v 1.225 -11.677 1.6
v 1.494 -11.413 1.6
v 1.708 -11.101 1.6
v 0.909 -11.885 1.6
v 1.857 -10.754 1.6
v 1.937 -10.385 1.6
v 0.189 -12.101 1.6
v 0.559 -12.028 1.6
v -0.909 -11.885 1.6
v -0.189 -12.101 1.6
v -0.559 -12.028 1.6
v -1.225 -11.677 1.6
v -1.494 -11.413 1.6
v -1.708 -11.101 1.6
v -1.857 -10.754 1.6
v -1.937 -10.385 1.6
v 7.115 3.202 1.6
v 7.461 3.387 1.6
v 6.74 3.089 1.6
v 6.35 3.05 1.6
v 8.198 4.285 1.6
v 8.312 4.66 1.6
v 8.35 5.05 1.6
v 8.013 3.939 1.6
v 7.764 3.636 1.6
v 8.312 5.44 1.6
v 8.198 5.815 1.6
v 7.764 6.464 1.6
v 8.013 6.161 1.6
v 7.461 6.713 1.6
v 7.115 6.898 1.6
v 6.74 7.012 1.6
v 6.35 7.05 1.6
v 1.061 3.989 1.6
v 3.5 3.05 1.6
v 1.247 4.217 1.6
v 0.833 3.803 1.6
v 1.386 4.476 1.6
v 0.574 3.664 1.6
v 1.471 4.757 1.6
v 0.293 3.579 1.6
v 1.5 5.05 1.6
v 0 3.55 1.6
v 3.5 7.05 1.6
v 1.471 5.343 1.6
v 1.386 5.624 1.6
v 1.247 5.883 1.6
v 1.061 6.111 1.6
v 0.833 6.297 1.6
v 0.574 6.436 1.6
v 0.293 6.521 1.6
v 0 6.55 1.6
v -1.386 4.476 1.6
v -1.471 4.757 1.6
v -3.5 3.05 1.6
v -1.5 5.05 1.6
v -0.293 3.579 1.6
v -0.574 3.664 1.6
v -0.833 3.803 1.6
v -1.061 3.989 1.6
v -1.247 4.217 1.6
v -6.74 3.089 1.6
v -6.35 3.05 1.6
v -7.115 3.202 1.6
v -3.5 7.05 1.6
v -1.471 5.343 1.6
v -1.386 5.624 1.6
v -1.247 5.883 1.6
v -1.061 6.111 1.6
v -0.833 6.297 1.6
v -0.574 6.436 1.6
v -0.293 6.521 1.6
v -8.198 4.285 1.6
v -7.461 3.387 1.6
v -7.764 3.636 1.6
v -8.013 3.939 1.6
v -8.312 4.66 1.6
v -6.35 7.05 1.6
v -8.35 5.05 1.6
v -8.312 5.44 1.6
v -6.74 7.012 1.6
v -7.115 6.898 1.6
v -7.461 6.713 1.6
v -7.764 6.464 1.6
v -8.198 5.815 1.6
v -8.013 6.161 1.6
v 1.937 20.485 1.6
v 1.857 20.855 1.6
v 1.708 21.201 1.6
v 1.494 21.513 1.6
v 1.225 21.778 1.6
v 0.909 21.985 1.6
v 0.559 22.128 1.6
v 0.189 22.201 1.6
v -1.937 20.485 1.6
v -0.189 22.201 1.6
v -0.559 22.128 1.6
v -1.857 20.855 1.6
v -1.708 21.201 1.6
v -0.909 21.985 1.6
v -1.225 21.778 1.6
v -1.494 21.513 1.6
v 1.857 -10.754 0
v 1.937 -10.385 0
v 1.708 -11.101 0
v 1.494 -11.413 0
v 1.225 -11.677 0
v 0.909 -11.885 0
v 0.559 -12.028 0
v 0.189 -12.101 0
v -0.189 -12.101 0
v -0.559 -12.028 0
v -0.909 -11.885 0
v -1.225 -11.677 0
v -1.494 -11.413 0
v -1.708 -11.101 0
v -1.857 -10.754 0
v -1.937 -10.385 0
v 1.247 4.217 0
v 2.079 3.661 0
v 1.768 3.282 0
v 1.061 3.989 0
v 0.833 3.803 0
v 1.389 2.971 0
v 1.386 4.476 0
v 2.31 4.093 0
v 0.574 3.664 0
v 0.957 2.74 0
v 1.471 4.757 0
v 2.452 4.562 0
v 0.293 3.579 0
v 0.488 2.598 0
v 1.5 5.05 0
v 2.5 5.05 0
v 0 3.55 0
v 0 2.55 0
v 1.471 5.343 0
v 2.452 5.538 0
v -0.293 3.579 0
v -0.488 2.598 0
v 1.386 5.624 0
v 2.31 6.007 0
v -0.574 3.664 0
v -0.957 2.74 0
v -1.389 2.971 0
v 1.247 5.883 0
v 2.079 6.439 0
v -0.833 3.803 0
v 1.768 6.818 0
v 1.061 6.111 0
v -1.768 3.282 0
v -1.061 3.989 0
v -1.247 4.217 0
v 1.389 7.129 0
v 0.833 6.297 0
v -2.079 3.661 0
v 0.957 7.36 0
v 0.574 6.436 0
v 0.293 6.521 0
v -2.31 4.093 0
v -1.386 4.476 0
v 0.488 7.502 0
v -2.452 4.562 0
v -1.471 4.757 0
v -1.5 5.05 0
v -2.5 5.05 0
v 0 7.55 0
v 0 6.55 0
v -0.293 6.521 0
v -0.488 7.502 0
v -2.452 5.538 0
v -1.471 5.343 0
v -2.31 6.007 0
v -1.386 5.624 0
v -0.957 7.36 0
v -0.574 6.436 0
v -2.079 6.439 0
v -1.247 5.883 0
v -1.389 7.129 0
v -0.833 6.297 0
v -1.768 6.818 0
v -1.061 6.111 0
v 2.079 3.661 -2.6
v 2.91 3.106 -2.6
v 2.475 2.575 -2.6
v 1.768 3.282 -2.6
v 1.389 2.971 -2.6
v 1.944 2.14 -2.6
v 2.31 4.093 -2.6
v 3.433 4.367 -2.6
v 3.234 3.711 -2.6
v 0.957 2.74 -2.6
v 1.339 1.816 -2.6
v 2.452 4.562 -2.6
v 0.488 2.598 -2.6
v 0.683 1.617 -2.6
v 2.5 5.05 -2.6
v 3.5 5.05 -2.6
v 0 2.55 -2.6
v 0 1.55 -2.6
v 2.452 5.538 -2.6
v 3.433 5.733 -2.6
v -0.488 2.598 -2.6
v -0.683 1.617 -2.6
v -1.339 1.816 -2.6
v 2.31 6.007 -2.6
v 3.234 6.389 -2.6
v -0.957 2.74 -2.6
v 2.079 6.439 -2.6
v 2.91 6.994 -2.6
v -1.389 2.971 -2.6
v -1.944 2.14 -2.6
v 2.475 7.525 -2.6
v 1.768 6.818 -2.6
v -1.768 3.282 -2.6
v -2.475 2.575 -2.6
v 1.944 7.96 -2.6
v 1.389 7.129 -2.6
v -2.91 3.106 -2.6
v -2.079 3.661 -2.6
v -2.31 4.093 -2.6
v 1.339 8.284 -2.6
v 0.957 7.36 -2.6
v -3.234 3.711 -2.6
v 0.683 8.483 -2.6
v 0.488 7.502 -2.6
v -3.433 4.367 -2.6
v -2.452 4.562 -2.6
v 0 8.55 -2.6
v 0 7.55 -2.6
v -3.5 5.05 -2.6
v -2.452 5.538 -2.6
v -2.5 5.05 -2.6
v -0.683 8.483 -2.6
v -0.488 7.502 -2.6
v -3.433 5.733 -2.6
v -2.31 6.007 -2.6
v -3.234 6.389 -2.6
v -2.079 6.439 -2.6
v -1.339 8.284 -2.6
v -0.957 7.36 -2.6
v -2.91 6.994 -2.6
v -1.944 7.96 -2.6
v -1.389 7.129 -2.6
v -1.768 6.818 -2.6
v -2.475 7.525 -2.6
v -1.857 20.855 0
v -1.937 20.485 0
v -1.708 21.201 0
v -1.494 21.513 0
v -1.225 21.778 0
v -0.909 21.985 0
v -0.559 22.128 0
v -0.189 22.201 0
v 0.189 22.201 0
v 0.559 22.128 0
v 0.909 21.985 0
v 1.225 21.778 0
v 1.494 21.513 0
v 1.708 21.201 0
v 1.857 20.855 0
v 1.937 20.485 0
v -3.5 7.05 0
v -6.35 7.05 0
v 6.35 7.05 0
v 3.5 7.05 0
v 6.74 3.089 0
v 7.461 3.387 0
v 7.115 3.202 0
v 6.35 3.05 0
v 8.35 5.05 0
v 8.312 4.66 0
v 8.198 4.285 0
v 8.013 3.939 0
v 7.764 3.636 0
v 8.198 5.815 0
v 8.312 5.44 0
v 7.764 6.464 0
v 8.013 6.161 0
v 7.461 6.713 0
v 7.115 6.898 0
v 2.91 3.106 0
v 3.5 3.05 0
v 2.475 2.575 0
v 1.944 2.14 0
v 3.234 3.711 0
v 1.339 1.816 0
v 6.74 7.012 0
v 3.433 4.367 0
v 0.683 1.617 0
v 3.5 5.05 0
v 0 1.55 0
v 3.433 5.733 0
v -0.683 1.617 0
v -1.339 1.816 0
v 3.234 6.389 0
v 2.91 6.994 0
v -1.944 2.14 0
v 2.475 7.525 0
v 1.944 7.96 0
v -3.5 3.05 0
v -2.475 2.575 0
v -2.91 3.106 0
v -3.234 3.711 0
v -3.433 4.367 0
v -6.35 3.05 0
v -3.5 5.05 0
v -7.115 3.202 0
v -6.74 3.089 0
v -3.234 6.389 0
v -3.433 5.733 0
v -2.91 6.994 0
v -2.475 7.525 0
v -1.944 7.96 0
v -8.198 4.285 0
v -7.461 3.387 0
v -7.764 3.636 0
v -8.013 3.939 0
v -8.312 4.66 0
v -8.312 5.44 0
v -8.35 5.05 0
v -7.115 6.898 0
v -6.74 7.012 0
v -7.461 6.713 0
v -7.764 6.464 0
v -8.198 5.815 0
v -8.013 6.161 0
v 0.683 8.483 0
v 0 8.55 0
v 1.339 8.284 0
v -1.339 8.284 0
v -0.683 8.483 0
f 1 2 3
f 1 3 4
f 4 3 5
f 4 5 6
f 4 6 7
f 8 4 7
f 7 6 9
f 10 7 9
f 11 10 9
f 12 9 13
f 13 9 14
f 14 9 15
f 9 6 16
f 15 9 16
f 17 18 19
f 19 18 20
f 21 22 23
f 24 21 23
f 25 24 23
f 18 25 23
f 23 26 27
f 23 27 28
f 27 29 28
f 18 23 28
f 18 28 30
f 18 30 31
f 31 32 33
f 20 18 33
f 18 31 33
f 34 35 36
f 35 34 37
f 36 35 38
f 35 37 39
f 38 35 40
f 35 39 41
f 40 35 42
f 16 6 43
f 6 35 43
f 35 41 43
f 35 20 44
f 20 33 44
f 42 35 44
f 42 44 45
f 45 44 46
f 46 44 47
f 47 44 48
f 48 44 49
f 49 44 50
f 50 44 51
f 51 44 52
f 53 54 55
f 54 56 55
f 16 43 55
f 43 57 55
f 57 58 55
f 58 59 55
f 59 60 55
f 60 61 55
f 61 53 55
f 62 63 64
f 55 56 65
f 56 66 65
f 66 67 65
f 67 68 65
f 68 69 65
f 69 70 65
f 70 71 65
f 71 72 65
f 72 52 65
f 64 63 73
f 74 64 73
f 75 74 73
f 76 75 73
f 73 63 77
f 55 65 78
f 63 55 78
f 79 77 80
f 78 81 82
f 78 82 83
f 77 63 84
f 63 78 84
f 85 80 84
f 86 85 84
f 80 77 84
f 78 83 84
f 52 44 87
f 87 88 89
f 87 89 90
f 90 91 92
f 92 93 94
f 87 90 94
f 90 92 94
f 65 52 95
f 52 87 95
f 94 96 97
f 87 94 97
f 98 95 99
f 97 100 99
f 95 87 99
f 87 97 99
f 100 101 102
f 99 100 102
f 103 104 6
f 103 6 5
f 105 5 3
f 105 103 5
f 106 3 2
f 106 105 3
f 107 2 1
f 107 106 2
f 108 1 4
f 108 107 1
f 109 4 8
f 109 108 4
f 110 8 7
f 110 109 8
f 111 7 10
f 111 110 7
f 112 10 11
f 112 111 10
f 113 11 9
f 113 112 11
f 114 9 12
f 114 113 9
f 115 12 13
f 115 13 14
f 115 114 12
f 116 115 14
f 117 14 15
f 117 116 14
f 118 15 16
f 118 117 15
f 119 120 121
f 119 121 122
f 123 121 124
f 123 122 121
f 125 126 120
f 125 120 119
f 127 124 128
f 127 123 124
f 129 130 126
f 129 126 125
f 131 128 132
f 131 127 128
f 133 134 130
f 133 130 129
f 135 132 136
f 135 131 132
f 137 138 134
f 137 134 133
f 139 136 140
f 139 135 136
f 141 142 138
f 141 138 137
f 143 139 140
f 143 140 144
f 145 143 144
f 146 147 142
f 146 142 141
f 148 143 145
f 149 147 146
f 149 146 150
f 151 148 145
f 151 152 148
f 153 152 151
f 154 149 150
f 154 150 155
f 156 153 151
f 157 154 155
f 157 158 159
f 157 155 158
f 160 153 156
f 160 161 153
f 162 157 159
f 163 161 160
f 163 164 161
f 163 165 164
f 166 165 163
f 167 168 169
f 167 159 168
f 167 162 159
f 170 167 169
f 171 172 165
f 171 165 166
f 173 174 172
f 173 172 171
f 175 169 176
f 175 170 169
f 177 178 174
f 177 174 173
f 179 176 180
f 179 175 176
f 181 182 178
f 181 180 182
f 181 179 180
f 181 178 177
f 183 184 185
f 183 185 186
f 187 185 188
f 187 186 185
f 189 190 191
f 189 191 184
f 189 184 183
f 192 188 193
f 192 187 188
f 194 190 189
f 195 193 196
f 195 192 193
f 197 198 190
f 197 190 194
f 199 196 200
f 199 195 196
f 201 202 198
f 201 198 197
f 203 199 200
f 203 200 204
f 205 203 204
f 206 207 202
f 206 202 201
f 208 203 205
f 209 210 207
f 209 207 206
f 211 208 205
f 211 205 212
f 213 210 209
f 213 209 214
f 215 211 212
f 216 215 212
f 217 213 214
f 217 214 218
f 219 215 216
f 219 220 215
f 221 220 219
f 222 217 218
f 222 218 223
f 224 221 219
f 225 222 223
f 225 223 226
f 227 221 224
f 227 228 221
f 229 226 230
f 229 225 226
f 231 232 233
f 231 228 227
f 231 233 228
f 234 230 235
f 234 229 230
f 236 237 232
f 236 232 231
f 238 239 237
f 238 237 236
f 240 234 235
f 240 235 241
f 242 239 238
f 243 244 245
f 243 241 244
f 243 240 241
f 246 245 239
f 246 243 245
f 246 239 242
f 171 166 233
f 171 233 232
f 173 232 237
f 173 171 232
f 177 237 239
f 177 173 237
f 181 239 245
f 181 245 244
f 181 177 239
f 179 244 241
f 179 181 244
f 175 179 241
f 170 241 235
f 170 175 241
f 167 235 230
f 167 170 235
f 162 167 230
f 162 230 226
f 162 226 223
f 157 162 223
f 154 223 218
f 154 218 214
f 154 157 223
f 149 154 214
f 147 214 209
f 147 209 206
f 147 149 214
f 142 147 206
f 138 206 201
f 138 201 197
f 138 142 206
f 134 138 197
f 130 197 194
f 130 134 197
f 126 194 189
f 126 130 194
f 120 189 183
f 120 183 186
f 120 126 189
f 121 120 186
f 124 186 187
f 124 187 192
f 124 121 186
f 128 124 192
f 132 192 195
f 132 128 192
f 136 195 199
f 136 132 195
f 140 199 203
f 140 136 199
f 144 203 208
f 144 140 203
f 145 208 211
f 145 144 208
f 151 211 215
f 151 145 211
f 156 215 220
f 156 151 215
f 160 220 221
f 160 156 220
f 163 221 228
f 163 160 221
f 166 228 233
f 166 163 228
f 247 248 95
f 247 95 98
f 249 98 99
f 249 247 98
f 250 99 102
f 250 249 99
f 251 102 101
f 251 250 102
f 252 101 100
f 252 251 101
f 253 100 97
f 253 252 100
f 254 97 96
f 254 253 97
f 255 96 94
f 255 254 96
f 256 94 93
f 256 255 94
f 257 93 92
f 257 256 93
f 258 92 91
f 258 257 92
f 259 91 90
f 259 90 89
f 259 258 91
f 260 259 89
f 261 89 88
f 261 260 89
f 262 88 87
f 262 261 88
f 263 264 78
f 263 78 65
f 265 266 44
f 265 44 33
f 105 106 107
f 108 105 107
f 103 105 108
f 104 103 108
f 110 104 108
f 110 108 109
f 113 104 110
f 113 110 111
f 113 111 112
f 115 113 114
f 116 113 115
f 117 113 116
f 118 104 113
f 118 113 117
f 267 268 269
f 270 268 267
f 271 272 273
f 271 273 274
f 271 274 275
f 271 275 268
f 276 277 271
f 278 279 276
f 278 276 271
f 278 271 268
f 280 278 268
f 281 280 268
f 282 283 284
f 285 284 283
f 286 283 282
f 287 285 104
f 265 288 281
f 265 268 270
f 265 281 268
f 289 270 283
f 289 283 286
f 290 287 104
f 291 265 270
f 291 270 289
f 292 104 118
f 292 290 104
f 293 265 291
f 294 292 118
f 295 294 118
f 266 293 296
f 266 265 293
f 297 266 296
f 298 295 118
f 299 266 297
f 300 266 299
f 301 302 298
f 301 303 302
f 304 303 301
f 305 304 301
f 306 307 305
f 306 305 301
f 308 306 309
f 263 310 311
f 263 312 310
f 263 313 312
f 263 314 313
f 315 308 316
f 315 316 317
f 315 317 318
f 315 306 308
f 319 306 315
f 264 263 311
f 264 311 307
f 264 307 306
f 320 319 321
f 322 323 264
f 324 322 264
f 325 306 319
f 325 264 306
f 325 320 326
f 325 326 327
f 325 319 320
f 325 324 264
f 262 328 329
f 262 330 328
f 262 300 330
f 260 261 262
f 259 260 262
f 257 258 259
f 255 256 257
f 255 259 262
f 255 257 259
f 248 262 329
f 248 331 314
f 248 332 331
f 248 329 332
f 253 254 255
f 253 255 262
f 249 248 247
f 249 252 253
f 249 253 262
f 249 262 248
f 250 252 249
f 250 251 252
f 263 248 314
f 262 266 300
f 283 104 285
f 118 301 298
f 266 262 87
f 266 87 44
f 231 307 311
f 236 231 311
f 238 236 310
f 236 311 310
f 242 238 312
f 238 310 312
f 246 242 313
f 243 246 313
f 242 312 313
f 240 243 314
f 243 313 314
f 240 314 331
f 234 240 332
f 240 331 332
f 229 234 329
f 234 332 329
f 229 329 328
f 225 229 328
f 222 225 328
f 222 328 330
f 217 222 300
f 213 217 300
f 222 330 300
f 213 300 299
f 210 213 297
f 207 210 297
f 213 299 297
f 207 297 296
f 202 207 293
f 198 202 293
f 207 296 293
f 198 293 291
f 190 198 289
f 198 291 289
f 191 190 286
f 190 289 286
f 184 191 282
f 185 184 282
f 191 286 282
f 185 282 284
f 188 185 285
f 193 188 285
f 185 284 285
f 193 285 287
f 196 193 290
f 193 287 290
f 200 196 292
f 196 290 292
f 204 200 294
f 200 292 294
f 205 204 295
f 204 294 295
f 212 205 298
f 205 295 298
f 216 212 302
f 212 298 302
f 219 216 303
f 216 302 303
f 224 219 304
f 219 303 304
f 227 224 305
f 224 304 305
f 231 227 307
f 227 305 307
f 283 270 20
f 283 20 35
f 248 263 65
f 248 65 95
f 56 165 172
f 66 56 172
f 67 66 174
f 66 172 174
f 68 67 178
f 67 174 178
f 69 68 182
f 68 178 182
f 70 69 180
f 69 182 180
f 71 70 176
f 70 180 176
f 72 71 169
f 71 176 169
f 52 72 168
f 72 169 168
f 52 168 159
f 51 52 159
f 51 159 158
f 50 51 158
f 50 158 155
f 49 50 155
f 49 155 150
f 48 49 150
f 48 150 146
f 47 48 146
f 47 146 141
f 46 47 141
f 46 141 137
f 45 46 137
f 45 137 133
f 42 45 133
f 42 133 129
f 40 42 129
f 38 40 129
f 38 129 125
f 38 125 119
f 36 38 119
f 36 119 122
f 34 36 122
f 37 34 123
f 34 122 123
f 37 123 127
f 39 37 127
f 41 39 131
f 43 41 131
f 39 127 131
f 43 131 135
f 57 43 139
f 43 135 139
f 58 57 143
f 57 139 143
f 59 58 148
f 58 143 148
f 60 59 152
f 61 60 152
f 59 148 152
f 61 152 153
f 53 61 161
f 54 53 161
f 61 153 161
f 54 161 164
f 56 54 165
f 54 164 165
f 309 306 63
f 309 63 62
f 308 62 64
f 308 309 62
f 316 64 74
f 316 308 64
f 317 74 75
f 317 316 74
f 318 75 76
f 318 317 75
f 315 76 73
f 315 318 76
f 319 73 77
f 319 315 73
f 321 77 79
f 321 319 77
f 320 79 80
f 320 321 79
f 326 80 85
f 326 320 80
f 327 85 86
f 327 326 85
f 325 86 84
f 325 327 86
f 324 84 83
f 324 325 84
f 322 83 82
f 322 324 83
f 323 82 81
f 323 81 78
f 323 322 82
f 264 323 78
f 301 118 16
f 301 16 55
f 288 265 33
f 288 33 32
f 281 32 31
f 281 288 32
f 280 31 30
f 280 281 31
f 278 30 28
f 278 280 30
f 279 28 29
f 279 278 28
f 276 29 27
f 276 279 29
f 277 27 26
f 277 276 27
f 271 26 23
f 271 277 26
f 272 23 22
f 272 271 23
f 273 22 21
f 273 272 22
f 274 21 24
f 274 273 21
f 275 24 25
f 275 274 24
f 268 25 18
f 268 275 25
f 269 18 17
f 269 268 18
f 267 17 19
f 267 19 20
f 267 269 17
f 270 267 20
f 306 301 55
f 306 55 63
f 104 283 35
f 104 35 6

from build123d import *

# Parameters (mm, degrees)
EXTRUDE_1_DEPTH     = 1.6
SKETCH_2_R          = 3.5
SKETCH_2_R_2        = 2.5
EXTRUDE_2_DEPTH     = 2.6
SKETCH_7_R          = 1.5
CUT_EXTRUDE_1_DEPTH = 6


with BuildPart() as part:
    # 草图1 → 凸台-拉伸1 (new body)
    with BuildSketch(Plane.XY):
        with BuildLine():
            Line((-6.349999999, 7.050124355), (-3.5, 7.050124355))
            Line((-3.5, 7.050124355), (-1.936935669, 20.485344653))
            ThreePointArc((-1.936935669, 20.485344653), (0, 22.21), (1.936935669, 20.485344653))
            Line((1.936935669, 20.485344653), (3.5, 7.050124355))
            Line((3.5, 7.050124355), (6.349999999, 7.050124355))
            ThreePointArc((6.349999999, 7.050124355), (8.349999999, 5.050124355), (6.349999999, 3.050124355))
            Line((6.349999999, 3.050124355), (3.5, 3.050124355))
            Line((3.5, 3.050124355), (1.936935669, -10.385095943))
            ThreePointArc((1.936935669, -10.385095943), (0, -12.10975129), (-1.936935669, -10.385095943))
            Line((-1.936935669, -10.385095943), (-3.5, 3.050124355))
            Line((-3.5, 3.050124355), (-6.349999999, 3.050124355))
            ThreePointArc((-6.349999999, 3.050124355), (-8.349999999, 5.050124355), (-6.349999999, 7.050124355))
        make_face()
    extrude(amount=EXTRUDE_1_DEPTH)

    # 草图2 → 凸台-拉伸2 (add)
    with BuildSketch(Plane(origin=(0, 0, 0), x_dir=(-1, 0, 0), z_dir=(0, 0, -1))):
        with Locations((0, 5.05)):
            Circle(SKETCH_2_R)
        with Locations((0, 5.05)):
            Circle(SKETCH_2_R_2, mode=Mode.SUBTRACT)
    extrude(amount=EXTRUDE_2_DEPTH)

    # 草图7 → 切除-拉伸1 (cut)
    with BuildSketch(Plane(origin=(0, 0, 0), x_dir=(-1, 0, 0), z_dir=(0, 0, -1))):
        with Locations((0, 5.05)):
            Circle(SKETCH_7_R)
    extrude(amount=-CUT_EXTRUDE_1_DEPTH, mode=Mode.SUBTRACT)


solid = part.part
